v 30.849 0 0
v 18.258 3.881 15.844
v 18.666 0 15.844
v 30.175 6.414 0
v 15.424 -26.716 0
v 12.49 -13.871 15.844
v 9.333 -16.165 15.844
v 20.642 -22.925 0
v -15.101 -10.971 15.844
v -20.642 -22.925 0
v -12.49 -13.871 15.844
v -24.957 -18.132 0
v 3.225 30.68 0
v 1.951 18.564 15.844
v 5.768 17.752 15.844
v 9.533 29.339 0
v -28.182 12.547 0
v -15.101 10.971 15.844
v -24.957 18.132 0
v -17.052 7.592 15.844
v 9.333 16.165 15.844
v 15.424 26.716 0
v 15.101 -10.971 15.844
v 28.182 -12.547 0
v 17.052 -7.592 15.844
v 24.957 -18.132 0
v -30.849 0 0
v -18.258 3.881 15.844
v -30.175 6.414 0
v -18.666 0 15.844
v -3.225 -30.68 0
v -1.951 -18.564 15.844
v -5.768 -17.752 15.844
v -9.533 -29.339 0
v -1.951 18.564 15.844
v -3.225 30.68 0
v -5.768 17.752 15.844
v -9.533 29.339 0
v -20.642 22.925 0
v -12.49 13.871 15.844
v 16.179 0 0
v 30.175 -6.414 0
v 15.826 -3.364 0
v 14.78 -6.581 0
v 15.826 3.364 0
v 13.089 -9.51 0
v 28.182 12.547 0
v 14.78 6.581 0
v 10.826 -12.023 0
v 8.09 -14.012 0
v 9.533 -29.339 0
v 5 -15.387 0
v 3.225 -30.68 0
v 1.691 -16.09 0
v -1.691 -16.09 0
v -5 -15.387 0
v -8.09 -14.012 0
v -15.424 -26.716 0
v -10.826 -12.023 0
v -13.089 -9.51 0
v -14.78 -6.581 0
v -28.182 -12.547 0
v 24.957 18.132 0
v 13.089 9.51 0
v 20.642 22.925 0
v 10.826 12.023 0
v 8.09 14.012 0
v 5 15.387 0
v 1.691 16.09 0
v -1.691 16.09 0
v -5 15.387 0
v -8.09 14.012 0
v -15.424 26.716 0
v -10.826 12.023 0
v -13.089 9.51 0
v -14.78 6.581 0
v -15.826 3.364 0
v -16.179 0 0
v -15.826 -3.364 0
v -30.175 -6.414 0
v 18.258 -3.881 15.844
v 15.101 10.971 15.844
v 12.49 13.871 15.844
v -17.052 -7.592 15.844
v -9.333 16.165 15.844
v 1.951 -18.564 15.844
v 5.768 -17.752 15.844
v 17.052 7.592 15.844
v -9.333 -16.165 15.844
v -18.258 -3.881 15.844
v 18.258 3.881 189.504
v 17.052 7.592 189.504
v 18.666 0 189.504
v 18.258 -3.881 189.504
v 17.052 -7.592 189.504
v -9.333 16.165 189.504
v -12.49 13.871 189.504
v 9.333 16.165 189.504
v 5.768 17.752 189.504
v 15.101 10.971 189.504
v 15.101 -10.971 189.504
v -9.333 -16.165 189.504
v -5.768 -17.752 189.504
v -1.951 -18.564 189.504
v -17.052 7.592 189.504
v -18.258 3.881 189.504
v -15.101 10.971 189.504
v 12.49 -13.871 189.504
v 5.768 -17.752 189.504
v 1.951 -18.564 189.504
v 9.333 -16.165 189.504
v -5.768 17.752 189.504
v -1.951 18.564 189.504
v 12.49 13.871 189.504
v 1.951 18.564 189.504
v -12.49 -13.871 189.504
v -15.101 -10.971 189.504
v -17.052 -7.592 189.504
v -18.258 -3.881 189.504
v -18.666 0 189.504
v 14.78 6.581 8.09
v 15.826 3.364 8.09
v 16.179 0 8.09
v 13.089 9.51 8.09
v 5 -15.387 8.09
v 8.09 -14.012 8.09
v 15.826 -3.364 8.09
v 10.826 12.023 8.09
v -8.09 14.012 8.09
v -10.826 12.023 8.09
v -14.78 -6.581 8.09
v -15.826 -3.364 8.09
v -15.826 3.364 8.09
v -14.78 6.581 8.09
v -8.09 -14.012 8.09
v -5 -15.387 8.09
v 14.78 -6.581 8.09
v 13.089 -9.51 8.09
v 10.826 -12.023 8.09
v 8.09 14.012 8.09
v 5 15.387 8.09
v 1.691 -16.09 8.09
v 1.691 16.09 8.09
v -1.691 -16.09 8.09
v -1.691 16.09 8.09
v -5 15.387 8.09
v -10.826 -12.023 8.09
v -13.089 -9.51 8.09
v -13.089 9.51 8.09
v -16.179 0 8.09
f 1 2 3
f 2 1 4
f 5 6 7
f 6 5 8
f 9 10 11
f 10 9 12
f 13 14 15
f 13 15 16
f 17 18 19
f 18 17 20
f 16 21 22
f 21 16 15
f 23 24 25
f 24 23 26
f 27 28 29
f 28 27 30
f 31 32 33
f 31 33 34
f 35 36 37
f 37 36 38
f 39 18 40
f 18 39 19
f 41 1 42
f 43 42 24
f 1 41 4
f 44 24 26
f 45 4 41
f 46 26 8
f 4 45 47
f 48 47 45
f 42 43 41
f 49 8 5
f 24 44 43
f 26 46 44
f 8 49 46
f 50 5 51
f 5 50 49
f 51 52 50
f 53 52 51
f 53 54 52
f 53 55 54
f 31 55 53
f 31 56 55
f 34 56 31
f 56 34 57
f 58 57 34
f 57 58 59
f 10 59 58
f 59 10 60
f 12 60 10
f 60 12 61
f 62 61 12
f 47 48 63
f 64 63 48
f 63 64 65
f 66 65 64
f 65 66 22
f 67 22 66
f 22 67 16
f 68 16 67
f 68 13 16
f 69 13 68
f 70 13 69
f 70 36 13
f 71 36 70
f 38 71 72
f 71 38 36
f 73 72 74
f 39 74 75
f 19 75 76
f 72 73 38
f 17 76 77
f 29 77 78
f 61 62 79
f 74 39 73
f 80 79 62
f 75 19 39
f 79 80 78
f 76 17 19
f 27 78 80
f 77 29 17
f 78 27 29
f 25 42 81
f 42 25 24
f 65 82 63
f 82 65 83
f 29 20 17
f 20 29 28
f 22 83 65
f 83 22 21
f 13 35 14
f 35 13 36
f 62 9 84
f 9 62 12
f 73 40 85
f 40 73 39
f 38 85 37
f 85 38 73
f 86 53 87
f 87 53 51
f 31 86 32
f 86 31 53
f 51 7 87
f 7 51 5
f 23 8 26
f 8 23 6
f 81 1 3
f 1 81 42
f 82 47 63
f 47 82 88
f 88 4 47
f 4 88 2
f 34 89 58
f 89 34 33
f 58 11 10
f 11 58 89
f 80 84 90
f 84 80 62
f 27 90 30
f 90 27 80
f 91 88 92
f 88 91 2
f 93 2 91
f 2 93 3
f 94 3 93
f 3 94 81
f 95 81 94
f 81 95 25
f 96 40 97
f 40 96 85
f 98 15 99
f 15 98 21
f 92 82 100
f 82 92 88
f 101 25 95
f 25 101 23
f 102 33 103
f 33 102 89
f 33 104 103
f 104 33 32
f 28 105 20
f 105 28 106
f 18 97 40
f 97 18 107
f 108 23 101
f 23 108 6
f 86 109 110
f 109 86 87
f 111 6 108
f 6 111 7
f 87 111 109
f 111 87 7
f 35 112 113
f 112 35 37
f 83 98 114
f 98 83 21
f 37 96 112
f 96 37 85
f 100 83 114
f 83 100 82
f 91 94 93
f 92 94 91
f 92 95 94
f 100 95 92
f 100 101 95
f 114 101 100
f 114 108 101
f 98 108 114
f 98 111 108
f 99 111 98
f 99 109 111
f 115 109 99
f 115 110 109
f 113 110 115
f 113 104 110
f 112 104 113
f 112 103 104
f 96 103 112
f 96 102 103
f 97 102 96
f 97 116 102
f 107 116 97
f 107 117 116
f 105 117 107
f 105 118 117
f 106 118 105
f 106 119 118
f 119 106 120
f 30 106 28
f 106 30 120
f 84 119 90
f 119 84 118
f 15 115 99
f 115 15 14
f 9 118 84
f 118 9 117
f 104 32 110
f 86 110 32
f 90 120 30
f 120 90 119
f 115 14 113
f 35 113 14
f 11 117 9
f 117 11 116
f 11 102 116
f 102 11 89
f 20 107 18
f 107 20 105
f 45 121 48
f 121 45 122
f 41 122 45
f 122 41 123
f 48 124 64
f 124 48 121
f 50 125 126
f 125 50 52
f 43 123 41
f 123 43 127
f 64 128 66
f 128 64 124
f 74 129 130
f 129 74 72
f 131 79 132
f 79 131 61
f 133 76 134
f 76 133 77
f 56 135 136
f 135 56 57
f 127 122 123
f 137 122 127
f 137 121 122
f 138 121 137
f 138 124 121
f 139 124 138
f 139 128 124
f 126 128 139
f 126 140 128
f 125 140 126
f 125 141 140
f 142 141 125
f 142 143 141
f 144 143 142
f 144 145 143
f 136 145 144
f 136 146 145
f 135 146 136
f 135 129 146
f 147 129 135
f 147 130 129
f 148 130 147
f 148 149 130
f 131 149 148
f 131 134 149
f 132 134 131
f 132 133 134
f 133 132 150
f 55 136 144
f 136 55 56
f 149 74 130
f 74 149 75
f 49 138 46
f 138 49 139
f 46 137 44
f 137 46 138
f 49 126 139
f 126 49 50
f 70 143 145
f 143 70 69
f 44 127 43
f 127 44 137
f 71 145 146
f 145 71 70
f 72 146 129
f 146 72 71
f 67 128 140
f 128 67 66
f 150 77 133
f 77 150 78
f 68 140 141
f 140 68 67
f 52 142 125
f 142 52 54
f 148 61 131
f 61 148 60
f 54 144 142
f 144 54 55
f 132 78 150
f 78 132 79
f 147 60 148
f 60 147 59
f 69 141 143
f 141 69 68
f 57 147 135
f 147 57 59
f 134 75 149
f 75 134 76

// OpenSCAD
seed = 2;
seeds = rands(0,1000000,10,seed);
head_outer_radius = rands(25,50,1,seeds[0])[0];
head_inner_radius = rands(10,head_outer_radius*2/3,1,seeds[1])[0];
head_length = rands(40,80,1,seeds[2])[0];
bolt_length = rands(head_length*2,200,1,seeds[3])[0];
cylinder_size = rands(head_inner_radius, head_length/4,1, seeds[4])[0];

difference(){
    union(){
        cylinder(head_length,head_outer_radius,0);
        cylinder(bolt_length,head_inner_radius,head_inner_radius);
    }
    cylinder(cylinder_size, cylinder_size, cylinder_size, true);
}
